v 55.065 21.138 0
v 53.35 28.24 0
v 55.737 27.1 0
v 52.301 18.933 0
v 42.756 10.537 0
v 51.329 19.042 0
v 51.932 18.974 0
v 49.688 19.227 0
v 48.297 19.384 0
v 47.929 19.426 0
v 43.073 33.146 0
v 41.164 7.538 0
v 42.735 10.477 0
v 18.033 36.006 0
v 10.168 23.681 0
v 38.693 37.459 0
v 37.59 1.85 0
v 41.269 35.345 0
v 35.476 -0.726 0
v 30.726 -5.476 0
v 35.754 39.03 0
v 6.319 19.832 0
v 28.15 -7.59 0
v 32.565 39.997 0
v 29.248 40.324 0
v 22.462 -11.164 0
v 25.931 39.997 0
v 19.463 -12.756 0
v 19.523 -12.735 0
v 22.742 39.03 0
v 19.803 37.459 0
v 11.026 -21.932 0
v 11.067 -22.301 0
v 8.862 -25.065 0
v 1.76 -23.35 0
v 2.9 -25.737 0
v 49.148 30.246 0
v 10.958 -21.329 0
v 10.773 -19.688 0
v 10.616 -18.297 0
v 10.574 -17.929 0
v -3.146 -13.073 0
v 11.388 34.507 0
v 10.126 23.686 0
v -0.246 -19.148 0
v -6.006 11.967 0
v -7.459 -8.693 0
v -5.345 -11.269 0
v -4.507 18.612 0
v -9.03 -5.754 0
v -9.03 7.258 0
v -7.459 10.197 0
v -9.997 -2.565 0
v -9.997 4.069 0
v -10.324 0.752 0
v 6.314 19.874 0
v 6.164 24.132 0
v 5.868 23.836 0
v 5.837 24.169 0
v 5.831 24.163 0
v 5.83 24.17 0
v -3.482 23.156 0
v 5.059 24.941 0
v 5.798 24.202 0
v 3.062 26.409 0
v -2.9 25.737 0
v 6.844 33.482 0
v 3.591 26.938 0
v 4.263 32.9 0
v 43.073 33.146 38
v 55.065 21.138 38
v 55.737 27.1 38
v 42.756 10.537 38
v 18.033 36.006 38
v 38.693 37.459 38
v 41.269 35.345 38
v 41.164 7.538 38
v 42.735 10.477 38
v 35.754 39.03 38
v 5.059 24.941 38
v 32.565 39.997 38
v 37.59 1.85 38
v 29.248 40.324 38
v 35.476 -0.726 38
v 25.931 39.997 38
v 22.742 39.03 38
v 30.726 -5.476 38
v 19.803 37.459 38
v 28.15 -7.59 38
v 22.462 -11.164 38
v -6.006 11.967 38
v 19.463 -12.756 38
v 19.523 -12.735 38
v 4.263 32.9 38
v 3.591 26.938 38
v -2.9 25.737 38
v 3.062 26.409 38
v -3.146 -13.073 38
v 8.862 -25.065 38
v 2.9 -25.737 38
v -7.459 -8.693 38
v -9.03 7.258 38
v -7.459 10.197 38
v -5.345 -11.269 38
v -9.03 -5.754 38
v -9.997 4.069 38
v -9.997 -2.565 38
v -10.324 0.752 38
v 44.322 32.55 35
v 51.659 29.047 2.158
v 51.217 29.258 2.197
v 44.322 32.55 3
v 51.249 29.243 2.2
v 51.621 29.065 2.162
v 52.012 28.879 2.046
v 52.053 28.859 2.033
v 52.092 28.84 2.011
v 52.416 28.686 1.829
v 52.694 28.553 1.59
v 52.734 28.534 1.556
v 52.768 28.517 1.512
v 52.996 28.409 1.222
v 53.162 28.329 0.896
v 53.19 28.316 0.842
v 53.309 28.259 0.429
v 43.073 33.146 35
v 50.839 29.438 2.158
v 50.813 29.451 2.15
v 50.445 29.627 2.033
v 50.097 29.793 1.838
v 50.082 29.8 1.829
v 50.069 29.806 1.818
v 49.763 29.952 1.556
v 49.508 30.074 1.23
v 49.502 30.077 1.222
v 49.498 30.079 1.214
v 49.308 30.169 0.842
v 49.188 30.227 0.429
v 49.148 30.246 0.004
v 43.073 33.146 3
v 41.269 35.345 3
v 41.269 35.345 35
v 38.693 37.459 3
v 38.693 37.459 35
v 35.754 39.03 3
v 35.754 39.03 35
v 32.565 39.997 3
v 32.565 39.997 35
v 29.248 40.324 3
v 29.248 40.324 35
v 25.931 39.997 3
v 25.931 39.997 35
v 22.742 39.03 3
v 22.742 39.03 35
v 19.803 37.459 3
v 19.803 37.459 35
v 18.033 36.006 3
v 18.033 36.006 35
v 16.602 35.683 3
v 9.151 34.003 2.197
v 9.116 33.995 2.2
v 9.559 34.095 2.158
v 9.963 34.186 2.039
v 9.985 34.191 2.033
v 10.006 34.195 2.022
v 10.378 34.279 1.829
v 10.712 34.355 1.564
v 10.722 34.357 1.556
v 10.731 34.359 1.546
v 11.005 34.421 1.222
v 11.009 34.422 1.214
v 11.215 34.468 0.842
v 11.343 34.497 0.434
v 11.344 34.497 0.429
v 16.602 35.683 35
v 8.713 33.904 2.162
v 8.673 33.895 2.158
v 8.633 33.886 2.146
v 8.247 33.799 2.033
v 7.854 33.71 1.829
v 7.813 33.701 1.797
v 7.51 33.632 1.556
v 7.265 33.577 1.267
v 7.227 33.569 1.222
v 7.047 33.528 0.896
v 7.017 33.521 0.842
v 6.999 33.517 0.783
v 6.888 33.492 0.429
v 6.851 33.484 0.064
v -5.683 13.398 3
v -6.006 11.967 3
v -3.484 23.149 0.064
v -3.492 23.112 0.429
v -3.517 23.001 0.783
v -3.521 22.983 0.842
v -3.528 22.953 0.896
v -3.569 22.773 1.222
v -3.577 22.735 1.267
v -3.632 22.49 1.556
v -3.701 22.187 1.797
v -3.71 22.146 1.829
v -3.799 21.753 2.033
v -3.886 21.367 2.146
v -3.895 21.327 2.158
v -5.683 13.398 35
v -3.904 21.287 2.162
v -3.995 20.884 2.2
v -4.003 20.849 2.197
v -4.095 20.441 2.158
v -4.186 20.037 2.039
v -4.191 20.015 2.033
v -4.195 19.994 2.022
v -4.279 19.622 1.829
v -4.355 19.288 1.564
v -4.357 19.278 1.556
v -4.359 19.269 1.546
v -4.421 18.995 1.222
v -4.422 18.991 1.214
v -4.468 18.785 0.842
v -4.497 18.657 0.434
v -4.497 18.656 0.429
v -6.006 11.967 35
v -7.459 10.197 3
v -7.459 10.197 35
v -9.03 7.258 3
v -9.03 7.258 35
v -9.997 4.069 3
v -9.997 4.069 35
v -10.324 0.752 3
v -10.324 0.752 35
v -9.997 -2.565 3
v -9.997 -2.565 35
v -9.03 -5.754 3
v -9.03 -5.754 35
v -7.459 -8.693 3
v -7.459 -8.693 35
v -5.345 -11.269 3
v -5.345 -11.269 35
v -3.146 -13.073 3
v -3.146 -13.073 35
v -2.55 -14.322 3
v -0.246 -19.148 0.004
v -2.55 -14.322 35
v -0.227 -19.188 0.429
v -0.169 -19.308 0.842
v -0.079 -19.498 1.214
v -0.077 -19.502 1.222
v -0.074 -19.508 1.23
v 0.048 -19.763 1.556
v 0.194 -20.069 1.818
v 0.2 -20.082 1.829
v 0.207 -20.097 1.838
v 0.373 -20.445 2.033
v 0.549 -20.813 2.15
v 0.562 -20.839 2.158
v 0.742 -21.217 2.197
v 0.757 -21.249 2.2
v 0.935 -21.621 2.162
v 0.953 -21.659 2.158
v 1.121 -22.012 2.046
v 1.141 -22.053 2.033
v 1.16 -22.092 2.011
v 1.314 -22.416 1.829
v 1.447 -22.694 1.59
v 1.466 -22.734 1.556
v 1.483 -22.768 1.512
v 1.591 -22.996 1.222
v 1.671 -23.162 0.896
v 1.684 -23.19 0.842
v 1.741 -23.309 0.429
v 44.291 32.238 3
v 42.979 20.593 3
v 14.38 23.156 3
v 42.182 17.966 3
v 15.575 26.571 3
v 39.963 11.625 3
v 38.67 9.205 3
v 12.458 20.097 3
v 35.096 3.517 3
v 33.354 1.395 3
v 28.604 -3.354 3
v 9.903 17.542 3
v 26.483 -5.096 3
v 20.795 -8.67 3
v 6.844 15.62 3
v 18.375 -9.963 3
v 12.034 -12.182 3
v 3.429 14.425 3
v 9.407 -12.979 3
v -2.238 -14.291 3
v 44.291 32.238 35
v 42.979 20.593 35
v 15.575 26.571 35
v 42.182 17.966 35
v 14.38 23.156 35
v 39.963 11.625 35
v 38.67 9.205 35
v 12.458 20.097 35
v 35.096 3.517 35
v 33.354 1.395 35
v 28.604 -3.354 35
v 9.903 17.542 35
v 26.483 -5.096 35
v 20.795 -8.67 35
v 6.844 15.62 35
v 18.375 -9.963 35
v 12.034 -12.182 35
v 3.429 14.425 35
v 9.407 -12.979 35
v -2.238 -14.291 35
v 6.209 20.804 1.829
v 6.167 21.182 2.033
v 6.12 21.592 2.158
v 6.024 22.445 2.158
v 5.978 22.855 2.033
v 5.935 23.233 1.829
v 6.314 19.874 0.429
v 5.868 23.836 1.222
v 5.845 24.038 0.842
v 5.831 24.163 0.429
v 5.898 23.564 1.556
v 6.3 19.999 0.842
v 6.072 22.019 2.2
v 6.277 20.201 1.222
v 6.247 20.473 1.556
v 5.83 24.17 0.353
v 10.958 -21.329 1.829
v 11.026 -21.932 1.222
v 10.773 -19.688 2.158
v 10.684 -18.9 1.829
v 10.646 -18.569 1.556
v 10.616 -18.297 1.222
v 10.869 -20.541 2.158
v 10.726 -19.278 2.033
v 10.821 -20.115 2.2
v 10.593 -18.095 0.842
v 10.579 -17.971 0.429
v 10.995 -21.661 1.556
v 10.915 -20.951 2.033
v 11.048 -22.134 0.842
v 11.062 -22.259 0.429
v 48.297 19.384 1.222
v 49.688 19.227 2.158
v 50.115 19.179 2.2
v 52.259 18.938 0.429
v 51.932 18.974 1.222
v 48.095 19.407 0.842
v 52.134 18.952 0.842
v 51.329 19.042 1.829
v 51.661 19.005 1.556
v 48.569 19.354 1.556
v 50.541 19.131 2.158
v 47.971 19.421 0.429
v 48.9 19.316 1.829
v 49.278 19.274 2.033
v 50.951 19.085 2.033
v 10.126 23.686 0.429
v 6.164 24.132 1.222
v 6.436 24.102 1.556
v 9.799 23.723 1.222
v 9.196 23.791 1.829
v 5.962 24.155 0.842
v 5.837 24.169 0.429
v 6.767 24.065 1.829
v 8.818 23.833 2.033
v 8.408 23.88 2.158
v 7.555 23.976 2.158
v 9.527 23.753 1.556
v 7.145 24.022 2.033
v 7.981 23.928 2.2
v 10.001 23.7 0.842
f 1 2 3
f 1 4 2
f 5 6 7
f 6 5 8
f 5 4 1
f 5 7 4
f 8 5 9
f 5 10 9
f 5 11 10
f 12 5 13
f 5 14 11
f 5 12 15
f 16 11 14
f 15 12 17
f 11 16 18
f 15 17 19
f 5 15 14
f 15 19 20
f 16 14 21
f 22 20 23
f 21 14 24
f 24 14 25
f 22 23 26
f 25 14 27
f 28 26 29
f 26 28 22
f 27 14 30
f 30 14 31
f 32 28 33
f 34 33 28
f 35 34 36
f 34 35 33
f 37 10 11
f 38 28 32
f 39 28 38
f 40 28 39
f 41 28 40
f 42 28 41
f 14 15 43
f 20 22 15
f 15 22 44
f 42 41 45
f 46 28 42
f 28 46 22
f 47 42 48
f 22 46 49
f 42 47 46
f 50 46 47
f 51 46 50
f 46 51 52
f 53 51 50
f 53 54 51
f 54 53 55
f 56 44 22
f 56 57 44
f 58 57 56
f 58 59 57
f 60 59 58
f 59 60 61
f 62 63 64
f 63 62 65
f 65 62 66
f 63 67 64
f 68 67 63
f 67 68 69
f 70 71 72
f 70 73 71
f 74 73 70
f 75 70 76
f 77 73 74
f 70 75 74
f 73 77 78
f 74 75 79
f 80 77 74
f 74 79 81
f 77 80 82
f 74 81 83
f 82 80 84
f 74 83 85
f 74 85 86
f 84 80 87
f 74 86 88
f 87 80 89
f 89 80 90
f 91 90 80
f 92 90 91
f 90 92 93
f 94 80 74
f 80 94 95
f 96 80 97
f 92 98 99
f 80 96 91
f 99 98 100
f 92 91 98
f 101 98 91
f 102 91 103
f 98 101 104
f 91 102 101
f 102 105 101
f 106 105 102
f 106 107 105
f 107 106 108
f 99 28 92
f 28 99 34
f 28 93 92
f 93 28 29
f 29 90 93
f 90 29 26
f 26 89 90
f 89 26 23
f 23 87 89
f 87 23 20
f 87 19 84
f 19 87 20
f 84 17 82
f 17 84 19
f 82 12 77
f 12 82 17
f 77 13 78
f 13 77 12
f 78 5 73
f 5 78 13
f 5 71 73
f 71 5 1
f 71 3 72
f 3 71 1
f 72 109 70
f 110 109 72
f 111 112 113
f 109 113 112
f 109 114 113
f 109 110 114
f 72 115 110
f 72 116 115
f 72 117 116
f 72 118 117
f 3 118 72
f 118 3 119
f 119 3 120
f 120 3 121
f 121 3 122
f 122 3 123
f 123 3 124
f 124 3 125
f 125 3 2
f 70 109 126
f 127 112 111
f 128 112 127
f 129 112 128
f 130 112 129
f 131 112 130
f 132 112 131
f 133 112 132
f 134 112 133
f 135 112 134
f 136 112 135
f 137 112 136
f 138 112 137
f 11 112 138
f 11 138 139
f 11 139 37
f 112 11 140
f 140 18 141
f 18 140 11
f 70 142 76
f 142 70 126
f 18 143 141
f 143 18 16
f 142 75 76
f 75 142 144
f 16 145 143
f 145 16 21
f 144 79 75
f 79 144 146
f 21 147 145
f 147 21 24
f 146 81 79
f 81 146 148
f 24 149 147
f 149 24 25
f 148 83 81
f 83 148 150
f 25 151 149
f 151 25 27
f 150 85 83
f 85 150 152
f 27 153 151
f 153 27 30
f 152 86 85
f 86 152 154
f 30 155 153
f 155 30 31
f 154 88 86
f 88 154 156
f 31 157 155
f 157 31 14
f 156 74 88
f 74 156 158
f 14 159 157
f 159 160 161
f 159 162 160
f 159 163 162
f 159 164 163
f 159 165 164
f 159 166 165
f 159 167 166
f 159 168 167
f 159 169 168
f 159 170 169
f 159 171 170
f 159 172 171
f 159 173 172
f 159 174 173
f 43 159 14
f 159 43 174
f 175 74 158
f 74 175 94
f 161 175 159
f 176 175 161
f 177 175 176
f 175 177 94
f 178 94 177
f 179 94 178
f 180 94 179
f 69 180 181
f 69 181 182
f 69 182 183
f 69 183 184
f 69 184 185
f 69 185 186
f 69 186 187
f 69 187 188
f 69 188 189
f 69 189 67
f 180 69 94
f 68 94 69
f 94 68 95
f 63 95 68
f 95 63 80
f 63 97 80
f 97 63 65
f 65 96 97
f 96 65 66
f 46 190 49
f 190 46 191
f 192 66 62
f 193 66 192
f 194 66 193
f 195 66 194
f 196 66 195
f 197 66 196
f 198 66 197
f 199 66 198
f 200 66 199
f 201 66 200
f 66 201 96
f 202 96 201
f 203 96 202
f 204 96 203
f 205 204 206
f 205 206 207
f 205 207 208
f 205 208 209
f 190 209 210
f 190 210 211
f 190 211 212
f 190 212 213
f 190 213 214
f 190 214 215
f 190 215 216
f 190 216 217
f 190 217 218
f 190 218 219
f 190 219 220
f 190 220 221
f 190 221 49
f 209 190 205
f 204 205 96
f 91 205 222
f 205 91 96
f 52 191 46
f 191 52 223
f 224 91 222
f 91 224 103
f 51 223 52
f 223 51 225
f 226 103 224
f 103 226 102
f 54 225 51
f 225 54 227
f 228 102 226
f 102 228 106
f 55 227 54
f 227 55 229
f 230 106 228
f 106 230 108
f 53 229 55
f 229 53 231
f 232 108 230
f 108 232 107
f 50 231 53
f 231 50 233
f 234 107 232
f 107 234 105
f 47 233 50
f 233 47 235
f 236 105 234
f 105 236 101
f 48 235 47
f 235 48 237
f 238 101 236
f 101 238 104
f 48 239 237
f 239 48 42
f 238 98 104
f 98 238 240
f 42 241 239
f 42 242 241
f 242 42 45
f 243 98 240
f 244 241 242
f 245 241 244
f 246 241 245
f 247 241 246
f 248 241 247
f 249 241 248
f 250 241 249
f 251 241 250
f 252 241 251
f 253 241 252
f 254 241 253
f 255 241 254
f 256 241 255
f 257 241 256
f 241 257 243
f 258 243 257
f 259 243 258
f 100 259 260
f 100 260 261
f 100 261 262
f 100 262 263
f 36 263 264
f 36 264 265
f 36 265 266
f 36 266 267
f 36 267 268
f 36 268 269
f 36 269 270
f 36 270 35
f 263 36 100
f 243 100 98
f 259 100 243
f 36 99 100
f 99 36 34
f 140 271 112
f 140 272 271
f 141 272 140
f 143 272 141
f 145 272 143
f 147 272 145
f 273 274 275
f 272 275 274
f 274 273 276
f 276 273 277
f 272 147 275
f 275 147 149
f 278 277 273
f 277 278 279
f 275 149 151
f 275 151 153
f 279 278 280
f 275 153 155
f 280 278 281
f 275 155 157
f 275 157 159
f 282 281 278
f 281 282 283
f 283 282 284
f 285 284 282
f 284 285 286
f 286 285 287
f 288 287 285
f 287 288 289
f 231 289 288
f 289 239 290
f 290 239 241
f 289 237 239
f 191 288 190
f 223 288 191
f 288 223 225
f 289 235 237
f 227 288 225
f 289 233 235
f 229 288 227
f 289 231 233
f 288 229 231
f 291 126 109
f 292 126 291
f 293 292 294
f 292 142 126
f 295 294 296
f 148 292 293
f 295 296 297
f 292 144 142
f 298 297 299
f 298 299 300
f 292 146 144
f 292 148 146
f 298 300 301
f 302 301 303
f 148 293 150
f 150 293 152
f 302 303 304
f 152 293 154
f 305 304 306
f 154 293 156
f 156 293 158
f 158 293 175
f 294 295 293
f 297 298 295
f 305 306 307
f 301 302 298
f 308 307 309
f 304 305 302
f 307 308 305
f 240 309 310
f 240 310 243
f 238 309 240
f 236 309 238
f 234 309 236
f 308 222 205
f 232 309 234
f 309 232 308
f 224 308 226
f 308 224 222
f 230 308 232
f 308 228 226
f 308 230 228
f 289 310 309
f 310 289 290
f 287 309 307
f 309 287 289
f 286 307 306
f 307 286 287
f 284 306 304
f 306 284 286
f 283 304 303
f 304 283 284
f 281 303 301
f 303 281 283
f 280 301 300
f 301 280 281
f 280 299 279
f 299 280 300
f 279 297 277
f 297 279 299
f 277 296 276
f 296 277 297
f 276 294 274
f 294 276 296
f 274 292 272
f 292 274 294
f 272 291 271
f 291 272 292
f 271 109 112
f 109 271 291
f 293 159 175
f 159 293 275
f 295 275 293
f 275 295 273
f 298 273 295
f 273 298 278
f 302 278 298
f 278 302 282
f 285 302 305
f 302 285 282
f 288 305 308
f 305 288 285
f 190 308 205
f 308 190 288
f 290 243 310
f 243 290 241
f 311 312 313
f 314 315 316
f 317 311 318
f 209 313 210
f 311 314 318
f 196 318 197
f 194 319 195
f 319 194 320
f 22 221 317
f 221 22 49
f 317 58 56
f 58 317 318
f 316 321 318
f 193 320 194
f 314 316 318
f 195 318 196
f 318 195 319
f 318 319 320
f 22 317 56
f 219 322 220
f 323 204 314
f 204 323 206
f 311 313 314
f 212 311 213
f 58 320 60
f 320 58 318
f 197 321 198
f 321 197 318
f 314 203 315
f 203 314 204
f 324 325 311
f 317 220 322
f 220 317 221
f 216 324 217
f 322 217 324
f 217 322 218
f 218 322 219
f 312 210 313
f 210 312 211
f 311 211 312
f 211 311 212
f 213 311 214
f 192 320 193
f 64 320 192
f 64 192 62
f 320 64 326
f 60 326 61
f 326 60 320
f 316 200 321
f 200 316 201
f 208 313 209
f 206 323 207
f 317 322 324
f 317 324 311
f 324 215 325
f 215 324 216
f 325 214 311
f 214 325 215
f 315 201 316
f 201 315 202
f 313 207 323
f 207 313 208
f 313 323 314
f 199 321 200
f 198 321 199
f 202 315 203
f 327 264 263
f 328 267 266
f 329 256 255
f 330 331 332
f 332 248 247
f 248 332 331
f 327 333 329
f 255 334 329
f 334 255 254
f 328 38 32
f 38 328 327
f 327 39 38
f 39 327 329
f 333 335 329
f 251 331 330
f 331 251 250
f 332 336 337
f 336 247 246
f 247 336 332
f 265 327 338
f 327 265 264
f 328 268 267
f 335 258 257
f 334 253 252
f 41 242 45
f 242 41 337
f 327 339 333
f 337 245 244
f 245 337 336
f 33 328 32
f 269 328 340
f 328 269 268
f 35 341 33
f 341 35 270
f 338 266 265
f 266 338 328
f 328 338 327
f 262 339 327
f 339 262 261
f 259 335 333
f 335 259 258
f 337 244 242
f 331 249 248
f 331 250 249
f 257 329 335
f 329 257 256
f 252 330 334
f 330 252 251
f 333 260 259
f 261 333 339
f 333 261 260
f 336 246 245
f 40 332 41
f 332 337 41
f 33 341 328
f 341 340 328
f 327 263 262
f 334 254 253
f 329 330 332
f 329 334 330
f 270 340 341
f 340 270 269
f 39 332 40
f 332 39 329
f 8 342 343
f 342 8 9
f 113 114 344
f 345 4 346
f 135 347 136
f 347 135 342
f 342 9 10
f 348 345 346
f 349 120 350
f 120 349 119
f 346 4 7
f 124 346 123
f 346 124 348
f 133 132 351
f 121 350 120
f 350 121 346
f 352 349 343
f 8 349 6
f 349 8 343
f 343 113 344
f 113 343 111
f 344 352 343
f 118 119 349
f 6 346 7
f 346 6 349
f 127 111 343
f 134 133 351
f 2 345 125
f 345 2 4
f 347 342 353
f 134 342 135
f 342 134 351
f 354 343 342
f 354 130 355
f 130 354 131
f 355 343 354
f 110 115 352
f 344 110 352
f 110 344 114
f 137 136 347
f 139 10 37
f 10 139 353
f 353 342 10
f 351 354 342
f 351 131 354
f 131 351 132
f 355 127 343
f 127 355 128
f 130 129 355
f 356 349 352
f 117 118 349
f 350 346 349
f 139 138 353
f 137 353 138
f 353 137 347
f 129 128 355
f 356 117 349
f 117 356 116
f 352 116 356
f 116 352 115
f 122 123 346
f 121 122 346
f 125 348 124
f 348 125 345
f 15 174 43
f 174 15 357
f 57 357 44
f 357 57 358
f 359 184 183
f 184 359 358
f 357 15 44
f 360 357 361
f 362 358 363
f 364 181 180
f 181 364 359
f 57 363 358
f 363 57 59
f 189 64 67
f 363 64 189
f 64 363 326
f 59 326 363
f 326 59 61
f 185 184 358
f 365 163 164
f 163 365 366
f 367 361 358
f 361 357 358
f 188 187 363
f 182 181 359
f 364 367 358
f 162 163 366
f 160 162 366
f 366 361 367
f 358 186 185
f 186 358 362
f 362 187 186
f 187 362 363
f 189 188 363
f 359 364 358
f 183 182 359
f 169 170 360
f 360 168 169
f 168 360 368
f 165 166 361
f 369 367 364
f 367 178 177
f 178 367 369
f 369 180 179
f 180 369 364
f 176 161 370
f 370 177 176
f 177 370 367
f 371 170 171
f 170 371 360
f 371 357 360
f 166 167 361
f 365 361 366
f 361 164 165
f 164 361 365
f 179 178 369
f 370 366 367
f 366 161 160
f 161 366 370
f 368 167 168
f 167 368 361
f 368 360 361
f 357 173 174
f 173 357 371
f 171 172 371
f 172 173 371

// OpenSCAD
$fn = 32;

// ----------------------------------------------------------------------
// Air duct: 34 mm duct, 3 mm wall, 38 mm across
// ----------------------------------------------------------------------

// --- parameters (mm) ---
duct_r = 17;              // duct core radius
duct_d = 34;              // duct core diameter
wall = 3;                 // duct wall thickness
height = 38;              // duct width (extrusion height)
port_r = 25.9;            // port flange half width
port_d = 51.8;            // port flange width
port_t = 6;               // port flange thickness
bolt_d = 4.4;             // port bolt holes
bolt_offset = 21.2;       // bolt hole offset from the port axis

difference() {
  /* outer hull chain: tube with a flat flange plate at every port */
  linear_extrude(height = 38) {
    hull() {
      polygon([[2.9, -25.737], [-2.9, 25.737], [3.062, 26.409], [8.862, -25.065]]);
      translate([8.943, 1.008]) circle(r = 17);
    }
    hull() {
      translate([8.943, 1.008]) circle(r = 17);
      translate([6.676, 0.752]) circle(r = 17);
    }
    hull() {
      translate([6.676, 0.752]) circle(r = 17);
      translate([13.017, 2.971]) circle(r = 17);
    }
    hull() {
      translate([13.017, 2.971]) circle(r = 17);
      translate([18.705, 6.545]) circle(r = 17);
    }
    hull() {
      translate([18.705, 6.545]) circle(r = 17);
      translate([23.455, 11.295]) circle(r = 17);
    }
    hull() {
      translate([23.455, 11.295]) circle(r = 17);
      translate([27.029, 16.983]) circle(r = 17);
    }
    hull() {
      translate([27.029, 16.983]) circle(r = 17);
      translate([29.248, 23.324]) circle(r = 17);
    }
    hull() {
      translate([29.248, 23.324]) circle(r = 17);
      translate([28.992, 21.057]) circle(r = 17);
    }
    hull() {
      translate([28.992, 21.057]) circle(r = 17);
      polygon([[4.263, 32.9], [55.737, 27.1], [55.065, 21.138], [3.591, 26.938]]);
    }
  }
  /* air passage: the same chain inset by the wall, 5 mm proud of the ports */
  translate([0, 0, 3]) linear_extrude(height = 32) {
    hull() {
      translate([-4.969, -0.56]) circle(r = 14);
      translate([6.676, 0.752]) circle(r = 14);
    }
    hull() {
      translate([6.676, 0.752]) circle(r = 14);
      translate([13.017, 2.971]) circle(r = 14);
    }
    hull() {
      translate([13.017, 2.971]) circle(r = 14);
      translate([18.705, 6.545]) circle(r = 14);
    }
    hull() {
      translate([18.705, 6.545]) circle(r = 14);
      translate([23.455, 11.295]) circle(r = 14);
    }
    hull() {
      translate([23.455, 11.295]) circle(r = 14);
      translate([27.029, 16.983]) circle(r = 14);
    }
    hull() {
      translate([27.029, 16.983]) circle(r = 14);
      translate([29.248, 23.324]) circle(r = 14);
    }
    hull() {
      translate([29.248, 23.324]) circle(r = 14);
      translate([30.56, 34.969]) circle(r = 14);
    }
  }
  translate([0, 0]) rotate([0, 0, -83.57]) translate([-21.2, -2.5]) rotate([-90, 0, 0]) cylinder(h = 11, d = 4.4);
  translate([0, 0]) rotate([0, 0, -83.57]) translate([21.2, -2.5]) rotate([-90, 0, 0]) cylinder(h = 11, d = 4.4);
  translate([30, 30]) rotate([0, 0, 173.57]) translate([-21.2, -2.5]) rotate([-90, 0, 0]) cylinder(h = 11, d = 4.4);
  translate([30, 30]) rotate([0, 0, 173.57]) translate([21.2, -2.5]) rotate([-90, 0, 0]) cylinder(h = 11, d = 4.4);
}
